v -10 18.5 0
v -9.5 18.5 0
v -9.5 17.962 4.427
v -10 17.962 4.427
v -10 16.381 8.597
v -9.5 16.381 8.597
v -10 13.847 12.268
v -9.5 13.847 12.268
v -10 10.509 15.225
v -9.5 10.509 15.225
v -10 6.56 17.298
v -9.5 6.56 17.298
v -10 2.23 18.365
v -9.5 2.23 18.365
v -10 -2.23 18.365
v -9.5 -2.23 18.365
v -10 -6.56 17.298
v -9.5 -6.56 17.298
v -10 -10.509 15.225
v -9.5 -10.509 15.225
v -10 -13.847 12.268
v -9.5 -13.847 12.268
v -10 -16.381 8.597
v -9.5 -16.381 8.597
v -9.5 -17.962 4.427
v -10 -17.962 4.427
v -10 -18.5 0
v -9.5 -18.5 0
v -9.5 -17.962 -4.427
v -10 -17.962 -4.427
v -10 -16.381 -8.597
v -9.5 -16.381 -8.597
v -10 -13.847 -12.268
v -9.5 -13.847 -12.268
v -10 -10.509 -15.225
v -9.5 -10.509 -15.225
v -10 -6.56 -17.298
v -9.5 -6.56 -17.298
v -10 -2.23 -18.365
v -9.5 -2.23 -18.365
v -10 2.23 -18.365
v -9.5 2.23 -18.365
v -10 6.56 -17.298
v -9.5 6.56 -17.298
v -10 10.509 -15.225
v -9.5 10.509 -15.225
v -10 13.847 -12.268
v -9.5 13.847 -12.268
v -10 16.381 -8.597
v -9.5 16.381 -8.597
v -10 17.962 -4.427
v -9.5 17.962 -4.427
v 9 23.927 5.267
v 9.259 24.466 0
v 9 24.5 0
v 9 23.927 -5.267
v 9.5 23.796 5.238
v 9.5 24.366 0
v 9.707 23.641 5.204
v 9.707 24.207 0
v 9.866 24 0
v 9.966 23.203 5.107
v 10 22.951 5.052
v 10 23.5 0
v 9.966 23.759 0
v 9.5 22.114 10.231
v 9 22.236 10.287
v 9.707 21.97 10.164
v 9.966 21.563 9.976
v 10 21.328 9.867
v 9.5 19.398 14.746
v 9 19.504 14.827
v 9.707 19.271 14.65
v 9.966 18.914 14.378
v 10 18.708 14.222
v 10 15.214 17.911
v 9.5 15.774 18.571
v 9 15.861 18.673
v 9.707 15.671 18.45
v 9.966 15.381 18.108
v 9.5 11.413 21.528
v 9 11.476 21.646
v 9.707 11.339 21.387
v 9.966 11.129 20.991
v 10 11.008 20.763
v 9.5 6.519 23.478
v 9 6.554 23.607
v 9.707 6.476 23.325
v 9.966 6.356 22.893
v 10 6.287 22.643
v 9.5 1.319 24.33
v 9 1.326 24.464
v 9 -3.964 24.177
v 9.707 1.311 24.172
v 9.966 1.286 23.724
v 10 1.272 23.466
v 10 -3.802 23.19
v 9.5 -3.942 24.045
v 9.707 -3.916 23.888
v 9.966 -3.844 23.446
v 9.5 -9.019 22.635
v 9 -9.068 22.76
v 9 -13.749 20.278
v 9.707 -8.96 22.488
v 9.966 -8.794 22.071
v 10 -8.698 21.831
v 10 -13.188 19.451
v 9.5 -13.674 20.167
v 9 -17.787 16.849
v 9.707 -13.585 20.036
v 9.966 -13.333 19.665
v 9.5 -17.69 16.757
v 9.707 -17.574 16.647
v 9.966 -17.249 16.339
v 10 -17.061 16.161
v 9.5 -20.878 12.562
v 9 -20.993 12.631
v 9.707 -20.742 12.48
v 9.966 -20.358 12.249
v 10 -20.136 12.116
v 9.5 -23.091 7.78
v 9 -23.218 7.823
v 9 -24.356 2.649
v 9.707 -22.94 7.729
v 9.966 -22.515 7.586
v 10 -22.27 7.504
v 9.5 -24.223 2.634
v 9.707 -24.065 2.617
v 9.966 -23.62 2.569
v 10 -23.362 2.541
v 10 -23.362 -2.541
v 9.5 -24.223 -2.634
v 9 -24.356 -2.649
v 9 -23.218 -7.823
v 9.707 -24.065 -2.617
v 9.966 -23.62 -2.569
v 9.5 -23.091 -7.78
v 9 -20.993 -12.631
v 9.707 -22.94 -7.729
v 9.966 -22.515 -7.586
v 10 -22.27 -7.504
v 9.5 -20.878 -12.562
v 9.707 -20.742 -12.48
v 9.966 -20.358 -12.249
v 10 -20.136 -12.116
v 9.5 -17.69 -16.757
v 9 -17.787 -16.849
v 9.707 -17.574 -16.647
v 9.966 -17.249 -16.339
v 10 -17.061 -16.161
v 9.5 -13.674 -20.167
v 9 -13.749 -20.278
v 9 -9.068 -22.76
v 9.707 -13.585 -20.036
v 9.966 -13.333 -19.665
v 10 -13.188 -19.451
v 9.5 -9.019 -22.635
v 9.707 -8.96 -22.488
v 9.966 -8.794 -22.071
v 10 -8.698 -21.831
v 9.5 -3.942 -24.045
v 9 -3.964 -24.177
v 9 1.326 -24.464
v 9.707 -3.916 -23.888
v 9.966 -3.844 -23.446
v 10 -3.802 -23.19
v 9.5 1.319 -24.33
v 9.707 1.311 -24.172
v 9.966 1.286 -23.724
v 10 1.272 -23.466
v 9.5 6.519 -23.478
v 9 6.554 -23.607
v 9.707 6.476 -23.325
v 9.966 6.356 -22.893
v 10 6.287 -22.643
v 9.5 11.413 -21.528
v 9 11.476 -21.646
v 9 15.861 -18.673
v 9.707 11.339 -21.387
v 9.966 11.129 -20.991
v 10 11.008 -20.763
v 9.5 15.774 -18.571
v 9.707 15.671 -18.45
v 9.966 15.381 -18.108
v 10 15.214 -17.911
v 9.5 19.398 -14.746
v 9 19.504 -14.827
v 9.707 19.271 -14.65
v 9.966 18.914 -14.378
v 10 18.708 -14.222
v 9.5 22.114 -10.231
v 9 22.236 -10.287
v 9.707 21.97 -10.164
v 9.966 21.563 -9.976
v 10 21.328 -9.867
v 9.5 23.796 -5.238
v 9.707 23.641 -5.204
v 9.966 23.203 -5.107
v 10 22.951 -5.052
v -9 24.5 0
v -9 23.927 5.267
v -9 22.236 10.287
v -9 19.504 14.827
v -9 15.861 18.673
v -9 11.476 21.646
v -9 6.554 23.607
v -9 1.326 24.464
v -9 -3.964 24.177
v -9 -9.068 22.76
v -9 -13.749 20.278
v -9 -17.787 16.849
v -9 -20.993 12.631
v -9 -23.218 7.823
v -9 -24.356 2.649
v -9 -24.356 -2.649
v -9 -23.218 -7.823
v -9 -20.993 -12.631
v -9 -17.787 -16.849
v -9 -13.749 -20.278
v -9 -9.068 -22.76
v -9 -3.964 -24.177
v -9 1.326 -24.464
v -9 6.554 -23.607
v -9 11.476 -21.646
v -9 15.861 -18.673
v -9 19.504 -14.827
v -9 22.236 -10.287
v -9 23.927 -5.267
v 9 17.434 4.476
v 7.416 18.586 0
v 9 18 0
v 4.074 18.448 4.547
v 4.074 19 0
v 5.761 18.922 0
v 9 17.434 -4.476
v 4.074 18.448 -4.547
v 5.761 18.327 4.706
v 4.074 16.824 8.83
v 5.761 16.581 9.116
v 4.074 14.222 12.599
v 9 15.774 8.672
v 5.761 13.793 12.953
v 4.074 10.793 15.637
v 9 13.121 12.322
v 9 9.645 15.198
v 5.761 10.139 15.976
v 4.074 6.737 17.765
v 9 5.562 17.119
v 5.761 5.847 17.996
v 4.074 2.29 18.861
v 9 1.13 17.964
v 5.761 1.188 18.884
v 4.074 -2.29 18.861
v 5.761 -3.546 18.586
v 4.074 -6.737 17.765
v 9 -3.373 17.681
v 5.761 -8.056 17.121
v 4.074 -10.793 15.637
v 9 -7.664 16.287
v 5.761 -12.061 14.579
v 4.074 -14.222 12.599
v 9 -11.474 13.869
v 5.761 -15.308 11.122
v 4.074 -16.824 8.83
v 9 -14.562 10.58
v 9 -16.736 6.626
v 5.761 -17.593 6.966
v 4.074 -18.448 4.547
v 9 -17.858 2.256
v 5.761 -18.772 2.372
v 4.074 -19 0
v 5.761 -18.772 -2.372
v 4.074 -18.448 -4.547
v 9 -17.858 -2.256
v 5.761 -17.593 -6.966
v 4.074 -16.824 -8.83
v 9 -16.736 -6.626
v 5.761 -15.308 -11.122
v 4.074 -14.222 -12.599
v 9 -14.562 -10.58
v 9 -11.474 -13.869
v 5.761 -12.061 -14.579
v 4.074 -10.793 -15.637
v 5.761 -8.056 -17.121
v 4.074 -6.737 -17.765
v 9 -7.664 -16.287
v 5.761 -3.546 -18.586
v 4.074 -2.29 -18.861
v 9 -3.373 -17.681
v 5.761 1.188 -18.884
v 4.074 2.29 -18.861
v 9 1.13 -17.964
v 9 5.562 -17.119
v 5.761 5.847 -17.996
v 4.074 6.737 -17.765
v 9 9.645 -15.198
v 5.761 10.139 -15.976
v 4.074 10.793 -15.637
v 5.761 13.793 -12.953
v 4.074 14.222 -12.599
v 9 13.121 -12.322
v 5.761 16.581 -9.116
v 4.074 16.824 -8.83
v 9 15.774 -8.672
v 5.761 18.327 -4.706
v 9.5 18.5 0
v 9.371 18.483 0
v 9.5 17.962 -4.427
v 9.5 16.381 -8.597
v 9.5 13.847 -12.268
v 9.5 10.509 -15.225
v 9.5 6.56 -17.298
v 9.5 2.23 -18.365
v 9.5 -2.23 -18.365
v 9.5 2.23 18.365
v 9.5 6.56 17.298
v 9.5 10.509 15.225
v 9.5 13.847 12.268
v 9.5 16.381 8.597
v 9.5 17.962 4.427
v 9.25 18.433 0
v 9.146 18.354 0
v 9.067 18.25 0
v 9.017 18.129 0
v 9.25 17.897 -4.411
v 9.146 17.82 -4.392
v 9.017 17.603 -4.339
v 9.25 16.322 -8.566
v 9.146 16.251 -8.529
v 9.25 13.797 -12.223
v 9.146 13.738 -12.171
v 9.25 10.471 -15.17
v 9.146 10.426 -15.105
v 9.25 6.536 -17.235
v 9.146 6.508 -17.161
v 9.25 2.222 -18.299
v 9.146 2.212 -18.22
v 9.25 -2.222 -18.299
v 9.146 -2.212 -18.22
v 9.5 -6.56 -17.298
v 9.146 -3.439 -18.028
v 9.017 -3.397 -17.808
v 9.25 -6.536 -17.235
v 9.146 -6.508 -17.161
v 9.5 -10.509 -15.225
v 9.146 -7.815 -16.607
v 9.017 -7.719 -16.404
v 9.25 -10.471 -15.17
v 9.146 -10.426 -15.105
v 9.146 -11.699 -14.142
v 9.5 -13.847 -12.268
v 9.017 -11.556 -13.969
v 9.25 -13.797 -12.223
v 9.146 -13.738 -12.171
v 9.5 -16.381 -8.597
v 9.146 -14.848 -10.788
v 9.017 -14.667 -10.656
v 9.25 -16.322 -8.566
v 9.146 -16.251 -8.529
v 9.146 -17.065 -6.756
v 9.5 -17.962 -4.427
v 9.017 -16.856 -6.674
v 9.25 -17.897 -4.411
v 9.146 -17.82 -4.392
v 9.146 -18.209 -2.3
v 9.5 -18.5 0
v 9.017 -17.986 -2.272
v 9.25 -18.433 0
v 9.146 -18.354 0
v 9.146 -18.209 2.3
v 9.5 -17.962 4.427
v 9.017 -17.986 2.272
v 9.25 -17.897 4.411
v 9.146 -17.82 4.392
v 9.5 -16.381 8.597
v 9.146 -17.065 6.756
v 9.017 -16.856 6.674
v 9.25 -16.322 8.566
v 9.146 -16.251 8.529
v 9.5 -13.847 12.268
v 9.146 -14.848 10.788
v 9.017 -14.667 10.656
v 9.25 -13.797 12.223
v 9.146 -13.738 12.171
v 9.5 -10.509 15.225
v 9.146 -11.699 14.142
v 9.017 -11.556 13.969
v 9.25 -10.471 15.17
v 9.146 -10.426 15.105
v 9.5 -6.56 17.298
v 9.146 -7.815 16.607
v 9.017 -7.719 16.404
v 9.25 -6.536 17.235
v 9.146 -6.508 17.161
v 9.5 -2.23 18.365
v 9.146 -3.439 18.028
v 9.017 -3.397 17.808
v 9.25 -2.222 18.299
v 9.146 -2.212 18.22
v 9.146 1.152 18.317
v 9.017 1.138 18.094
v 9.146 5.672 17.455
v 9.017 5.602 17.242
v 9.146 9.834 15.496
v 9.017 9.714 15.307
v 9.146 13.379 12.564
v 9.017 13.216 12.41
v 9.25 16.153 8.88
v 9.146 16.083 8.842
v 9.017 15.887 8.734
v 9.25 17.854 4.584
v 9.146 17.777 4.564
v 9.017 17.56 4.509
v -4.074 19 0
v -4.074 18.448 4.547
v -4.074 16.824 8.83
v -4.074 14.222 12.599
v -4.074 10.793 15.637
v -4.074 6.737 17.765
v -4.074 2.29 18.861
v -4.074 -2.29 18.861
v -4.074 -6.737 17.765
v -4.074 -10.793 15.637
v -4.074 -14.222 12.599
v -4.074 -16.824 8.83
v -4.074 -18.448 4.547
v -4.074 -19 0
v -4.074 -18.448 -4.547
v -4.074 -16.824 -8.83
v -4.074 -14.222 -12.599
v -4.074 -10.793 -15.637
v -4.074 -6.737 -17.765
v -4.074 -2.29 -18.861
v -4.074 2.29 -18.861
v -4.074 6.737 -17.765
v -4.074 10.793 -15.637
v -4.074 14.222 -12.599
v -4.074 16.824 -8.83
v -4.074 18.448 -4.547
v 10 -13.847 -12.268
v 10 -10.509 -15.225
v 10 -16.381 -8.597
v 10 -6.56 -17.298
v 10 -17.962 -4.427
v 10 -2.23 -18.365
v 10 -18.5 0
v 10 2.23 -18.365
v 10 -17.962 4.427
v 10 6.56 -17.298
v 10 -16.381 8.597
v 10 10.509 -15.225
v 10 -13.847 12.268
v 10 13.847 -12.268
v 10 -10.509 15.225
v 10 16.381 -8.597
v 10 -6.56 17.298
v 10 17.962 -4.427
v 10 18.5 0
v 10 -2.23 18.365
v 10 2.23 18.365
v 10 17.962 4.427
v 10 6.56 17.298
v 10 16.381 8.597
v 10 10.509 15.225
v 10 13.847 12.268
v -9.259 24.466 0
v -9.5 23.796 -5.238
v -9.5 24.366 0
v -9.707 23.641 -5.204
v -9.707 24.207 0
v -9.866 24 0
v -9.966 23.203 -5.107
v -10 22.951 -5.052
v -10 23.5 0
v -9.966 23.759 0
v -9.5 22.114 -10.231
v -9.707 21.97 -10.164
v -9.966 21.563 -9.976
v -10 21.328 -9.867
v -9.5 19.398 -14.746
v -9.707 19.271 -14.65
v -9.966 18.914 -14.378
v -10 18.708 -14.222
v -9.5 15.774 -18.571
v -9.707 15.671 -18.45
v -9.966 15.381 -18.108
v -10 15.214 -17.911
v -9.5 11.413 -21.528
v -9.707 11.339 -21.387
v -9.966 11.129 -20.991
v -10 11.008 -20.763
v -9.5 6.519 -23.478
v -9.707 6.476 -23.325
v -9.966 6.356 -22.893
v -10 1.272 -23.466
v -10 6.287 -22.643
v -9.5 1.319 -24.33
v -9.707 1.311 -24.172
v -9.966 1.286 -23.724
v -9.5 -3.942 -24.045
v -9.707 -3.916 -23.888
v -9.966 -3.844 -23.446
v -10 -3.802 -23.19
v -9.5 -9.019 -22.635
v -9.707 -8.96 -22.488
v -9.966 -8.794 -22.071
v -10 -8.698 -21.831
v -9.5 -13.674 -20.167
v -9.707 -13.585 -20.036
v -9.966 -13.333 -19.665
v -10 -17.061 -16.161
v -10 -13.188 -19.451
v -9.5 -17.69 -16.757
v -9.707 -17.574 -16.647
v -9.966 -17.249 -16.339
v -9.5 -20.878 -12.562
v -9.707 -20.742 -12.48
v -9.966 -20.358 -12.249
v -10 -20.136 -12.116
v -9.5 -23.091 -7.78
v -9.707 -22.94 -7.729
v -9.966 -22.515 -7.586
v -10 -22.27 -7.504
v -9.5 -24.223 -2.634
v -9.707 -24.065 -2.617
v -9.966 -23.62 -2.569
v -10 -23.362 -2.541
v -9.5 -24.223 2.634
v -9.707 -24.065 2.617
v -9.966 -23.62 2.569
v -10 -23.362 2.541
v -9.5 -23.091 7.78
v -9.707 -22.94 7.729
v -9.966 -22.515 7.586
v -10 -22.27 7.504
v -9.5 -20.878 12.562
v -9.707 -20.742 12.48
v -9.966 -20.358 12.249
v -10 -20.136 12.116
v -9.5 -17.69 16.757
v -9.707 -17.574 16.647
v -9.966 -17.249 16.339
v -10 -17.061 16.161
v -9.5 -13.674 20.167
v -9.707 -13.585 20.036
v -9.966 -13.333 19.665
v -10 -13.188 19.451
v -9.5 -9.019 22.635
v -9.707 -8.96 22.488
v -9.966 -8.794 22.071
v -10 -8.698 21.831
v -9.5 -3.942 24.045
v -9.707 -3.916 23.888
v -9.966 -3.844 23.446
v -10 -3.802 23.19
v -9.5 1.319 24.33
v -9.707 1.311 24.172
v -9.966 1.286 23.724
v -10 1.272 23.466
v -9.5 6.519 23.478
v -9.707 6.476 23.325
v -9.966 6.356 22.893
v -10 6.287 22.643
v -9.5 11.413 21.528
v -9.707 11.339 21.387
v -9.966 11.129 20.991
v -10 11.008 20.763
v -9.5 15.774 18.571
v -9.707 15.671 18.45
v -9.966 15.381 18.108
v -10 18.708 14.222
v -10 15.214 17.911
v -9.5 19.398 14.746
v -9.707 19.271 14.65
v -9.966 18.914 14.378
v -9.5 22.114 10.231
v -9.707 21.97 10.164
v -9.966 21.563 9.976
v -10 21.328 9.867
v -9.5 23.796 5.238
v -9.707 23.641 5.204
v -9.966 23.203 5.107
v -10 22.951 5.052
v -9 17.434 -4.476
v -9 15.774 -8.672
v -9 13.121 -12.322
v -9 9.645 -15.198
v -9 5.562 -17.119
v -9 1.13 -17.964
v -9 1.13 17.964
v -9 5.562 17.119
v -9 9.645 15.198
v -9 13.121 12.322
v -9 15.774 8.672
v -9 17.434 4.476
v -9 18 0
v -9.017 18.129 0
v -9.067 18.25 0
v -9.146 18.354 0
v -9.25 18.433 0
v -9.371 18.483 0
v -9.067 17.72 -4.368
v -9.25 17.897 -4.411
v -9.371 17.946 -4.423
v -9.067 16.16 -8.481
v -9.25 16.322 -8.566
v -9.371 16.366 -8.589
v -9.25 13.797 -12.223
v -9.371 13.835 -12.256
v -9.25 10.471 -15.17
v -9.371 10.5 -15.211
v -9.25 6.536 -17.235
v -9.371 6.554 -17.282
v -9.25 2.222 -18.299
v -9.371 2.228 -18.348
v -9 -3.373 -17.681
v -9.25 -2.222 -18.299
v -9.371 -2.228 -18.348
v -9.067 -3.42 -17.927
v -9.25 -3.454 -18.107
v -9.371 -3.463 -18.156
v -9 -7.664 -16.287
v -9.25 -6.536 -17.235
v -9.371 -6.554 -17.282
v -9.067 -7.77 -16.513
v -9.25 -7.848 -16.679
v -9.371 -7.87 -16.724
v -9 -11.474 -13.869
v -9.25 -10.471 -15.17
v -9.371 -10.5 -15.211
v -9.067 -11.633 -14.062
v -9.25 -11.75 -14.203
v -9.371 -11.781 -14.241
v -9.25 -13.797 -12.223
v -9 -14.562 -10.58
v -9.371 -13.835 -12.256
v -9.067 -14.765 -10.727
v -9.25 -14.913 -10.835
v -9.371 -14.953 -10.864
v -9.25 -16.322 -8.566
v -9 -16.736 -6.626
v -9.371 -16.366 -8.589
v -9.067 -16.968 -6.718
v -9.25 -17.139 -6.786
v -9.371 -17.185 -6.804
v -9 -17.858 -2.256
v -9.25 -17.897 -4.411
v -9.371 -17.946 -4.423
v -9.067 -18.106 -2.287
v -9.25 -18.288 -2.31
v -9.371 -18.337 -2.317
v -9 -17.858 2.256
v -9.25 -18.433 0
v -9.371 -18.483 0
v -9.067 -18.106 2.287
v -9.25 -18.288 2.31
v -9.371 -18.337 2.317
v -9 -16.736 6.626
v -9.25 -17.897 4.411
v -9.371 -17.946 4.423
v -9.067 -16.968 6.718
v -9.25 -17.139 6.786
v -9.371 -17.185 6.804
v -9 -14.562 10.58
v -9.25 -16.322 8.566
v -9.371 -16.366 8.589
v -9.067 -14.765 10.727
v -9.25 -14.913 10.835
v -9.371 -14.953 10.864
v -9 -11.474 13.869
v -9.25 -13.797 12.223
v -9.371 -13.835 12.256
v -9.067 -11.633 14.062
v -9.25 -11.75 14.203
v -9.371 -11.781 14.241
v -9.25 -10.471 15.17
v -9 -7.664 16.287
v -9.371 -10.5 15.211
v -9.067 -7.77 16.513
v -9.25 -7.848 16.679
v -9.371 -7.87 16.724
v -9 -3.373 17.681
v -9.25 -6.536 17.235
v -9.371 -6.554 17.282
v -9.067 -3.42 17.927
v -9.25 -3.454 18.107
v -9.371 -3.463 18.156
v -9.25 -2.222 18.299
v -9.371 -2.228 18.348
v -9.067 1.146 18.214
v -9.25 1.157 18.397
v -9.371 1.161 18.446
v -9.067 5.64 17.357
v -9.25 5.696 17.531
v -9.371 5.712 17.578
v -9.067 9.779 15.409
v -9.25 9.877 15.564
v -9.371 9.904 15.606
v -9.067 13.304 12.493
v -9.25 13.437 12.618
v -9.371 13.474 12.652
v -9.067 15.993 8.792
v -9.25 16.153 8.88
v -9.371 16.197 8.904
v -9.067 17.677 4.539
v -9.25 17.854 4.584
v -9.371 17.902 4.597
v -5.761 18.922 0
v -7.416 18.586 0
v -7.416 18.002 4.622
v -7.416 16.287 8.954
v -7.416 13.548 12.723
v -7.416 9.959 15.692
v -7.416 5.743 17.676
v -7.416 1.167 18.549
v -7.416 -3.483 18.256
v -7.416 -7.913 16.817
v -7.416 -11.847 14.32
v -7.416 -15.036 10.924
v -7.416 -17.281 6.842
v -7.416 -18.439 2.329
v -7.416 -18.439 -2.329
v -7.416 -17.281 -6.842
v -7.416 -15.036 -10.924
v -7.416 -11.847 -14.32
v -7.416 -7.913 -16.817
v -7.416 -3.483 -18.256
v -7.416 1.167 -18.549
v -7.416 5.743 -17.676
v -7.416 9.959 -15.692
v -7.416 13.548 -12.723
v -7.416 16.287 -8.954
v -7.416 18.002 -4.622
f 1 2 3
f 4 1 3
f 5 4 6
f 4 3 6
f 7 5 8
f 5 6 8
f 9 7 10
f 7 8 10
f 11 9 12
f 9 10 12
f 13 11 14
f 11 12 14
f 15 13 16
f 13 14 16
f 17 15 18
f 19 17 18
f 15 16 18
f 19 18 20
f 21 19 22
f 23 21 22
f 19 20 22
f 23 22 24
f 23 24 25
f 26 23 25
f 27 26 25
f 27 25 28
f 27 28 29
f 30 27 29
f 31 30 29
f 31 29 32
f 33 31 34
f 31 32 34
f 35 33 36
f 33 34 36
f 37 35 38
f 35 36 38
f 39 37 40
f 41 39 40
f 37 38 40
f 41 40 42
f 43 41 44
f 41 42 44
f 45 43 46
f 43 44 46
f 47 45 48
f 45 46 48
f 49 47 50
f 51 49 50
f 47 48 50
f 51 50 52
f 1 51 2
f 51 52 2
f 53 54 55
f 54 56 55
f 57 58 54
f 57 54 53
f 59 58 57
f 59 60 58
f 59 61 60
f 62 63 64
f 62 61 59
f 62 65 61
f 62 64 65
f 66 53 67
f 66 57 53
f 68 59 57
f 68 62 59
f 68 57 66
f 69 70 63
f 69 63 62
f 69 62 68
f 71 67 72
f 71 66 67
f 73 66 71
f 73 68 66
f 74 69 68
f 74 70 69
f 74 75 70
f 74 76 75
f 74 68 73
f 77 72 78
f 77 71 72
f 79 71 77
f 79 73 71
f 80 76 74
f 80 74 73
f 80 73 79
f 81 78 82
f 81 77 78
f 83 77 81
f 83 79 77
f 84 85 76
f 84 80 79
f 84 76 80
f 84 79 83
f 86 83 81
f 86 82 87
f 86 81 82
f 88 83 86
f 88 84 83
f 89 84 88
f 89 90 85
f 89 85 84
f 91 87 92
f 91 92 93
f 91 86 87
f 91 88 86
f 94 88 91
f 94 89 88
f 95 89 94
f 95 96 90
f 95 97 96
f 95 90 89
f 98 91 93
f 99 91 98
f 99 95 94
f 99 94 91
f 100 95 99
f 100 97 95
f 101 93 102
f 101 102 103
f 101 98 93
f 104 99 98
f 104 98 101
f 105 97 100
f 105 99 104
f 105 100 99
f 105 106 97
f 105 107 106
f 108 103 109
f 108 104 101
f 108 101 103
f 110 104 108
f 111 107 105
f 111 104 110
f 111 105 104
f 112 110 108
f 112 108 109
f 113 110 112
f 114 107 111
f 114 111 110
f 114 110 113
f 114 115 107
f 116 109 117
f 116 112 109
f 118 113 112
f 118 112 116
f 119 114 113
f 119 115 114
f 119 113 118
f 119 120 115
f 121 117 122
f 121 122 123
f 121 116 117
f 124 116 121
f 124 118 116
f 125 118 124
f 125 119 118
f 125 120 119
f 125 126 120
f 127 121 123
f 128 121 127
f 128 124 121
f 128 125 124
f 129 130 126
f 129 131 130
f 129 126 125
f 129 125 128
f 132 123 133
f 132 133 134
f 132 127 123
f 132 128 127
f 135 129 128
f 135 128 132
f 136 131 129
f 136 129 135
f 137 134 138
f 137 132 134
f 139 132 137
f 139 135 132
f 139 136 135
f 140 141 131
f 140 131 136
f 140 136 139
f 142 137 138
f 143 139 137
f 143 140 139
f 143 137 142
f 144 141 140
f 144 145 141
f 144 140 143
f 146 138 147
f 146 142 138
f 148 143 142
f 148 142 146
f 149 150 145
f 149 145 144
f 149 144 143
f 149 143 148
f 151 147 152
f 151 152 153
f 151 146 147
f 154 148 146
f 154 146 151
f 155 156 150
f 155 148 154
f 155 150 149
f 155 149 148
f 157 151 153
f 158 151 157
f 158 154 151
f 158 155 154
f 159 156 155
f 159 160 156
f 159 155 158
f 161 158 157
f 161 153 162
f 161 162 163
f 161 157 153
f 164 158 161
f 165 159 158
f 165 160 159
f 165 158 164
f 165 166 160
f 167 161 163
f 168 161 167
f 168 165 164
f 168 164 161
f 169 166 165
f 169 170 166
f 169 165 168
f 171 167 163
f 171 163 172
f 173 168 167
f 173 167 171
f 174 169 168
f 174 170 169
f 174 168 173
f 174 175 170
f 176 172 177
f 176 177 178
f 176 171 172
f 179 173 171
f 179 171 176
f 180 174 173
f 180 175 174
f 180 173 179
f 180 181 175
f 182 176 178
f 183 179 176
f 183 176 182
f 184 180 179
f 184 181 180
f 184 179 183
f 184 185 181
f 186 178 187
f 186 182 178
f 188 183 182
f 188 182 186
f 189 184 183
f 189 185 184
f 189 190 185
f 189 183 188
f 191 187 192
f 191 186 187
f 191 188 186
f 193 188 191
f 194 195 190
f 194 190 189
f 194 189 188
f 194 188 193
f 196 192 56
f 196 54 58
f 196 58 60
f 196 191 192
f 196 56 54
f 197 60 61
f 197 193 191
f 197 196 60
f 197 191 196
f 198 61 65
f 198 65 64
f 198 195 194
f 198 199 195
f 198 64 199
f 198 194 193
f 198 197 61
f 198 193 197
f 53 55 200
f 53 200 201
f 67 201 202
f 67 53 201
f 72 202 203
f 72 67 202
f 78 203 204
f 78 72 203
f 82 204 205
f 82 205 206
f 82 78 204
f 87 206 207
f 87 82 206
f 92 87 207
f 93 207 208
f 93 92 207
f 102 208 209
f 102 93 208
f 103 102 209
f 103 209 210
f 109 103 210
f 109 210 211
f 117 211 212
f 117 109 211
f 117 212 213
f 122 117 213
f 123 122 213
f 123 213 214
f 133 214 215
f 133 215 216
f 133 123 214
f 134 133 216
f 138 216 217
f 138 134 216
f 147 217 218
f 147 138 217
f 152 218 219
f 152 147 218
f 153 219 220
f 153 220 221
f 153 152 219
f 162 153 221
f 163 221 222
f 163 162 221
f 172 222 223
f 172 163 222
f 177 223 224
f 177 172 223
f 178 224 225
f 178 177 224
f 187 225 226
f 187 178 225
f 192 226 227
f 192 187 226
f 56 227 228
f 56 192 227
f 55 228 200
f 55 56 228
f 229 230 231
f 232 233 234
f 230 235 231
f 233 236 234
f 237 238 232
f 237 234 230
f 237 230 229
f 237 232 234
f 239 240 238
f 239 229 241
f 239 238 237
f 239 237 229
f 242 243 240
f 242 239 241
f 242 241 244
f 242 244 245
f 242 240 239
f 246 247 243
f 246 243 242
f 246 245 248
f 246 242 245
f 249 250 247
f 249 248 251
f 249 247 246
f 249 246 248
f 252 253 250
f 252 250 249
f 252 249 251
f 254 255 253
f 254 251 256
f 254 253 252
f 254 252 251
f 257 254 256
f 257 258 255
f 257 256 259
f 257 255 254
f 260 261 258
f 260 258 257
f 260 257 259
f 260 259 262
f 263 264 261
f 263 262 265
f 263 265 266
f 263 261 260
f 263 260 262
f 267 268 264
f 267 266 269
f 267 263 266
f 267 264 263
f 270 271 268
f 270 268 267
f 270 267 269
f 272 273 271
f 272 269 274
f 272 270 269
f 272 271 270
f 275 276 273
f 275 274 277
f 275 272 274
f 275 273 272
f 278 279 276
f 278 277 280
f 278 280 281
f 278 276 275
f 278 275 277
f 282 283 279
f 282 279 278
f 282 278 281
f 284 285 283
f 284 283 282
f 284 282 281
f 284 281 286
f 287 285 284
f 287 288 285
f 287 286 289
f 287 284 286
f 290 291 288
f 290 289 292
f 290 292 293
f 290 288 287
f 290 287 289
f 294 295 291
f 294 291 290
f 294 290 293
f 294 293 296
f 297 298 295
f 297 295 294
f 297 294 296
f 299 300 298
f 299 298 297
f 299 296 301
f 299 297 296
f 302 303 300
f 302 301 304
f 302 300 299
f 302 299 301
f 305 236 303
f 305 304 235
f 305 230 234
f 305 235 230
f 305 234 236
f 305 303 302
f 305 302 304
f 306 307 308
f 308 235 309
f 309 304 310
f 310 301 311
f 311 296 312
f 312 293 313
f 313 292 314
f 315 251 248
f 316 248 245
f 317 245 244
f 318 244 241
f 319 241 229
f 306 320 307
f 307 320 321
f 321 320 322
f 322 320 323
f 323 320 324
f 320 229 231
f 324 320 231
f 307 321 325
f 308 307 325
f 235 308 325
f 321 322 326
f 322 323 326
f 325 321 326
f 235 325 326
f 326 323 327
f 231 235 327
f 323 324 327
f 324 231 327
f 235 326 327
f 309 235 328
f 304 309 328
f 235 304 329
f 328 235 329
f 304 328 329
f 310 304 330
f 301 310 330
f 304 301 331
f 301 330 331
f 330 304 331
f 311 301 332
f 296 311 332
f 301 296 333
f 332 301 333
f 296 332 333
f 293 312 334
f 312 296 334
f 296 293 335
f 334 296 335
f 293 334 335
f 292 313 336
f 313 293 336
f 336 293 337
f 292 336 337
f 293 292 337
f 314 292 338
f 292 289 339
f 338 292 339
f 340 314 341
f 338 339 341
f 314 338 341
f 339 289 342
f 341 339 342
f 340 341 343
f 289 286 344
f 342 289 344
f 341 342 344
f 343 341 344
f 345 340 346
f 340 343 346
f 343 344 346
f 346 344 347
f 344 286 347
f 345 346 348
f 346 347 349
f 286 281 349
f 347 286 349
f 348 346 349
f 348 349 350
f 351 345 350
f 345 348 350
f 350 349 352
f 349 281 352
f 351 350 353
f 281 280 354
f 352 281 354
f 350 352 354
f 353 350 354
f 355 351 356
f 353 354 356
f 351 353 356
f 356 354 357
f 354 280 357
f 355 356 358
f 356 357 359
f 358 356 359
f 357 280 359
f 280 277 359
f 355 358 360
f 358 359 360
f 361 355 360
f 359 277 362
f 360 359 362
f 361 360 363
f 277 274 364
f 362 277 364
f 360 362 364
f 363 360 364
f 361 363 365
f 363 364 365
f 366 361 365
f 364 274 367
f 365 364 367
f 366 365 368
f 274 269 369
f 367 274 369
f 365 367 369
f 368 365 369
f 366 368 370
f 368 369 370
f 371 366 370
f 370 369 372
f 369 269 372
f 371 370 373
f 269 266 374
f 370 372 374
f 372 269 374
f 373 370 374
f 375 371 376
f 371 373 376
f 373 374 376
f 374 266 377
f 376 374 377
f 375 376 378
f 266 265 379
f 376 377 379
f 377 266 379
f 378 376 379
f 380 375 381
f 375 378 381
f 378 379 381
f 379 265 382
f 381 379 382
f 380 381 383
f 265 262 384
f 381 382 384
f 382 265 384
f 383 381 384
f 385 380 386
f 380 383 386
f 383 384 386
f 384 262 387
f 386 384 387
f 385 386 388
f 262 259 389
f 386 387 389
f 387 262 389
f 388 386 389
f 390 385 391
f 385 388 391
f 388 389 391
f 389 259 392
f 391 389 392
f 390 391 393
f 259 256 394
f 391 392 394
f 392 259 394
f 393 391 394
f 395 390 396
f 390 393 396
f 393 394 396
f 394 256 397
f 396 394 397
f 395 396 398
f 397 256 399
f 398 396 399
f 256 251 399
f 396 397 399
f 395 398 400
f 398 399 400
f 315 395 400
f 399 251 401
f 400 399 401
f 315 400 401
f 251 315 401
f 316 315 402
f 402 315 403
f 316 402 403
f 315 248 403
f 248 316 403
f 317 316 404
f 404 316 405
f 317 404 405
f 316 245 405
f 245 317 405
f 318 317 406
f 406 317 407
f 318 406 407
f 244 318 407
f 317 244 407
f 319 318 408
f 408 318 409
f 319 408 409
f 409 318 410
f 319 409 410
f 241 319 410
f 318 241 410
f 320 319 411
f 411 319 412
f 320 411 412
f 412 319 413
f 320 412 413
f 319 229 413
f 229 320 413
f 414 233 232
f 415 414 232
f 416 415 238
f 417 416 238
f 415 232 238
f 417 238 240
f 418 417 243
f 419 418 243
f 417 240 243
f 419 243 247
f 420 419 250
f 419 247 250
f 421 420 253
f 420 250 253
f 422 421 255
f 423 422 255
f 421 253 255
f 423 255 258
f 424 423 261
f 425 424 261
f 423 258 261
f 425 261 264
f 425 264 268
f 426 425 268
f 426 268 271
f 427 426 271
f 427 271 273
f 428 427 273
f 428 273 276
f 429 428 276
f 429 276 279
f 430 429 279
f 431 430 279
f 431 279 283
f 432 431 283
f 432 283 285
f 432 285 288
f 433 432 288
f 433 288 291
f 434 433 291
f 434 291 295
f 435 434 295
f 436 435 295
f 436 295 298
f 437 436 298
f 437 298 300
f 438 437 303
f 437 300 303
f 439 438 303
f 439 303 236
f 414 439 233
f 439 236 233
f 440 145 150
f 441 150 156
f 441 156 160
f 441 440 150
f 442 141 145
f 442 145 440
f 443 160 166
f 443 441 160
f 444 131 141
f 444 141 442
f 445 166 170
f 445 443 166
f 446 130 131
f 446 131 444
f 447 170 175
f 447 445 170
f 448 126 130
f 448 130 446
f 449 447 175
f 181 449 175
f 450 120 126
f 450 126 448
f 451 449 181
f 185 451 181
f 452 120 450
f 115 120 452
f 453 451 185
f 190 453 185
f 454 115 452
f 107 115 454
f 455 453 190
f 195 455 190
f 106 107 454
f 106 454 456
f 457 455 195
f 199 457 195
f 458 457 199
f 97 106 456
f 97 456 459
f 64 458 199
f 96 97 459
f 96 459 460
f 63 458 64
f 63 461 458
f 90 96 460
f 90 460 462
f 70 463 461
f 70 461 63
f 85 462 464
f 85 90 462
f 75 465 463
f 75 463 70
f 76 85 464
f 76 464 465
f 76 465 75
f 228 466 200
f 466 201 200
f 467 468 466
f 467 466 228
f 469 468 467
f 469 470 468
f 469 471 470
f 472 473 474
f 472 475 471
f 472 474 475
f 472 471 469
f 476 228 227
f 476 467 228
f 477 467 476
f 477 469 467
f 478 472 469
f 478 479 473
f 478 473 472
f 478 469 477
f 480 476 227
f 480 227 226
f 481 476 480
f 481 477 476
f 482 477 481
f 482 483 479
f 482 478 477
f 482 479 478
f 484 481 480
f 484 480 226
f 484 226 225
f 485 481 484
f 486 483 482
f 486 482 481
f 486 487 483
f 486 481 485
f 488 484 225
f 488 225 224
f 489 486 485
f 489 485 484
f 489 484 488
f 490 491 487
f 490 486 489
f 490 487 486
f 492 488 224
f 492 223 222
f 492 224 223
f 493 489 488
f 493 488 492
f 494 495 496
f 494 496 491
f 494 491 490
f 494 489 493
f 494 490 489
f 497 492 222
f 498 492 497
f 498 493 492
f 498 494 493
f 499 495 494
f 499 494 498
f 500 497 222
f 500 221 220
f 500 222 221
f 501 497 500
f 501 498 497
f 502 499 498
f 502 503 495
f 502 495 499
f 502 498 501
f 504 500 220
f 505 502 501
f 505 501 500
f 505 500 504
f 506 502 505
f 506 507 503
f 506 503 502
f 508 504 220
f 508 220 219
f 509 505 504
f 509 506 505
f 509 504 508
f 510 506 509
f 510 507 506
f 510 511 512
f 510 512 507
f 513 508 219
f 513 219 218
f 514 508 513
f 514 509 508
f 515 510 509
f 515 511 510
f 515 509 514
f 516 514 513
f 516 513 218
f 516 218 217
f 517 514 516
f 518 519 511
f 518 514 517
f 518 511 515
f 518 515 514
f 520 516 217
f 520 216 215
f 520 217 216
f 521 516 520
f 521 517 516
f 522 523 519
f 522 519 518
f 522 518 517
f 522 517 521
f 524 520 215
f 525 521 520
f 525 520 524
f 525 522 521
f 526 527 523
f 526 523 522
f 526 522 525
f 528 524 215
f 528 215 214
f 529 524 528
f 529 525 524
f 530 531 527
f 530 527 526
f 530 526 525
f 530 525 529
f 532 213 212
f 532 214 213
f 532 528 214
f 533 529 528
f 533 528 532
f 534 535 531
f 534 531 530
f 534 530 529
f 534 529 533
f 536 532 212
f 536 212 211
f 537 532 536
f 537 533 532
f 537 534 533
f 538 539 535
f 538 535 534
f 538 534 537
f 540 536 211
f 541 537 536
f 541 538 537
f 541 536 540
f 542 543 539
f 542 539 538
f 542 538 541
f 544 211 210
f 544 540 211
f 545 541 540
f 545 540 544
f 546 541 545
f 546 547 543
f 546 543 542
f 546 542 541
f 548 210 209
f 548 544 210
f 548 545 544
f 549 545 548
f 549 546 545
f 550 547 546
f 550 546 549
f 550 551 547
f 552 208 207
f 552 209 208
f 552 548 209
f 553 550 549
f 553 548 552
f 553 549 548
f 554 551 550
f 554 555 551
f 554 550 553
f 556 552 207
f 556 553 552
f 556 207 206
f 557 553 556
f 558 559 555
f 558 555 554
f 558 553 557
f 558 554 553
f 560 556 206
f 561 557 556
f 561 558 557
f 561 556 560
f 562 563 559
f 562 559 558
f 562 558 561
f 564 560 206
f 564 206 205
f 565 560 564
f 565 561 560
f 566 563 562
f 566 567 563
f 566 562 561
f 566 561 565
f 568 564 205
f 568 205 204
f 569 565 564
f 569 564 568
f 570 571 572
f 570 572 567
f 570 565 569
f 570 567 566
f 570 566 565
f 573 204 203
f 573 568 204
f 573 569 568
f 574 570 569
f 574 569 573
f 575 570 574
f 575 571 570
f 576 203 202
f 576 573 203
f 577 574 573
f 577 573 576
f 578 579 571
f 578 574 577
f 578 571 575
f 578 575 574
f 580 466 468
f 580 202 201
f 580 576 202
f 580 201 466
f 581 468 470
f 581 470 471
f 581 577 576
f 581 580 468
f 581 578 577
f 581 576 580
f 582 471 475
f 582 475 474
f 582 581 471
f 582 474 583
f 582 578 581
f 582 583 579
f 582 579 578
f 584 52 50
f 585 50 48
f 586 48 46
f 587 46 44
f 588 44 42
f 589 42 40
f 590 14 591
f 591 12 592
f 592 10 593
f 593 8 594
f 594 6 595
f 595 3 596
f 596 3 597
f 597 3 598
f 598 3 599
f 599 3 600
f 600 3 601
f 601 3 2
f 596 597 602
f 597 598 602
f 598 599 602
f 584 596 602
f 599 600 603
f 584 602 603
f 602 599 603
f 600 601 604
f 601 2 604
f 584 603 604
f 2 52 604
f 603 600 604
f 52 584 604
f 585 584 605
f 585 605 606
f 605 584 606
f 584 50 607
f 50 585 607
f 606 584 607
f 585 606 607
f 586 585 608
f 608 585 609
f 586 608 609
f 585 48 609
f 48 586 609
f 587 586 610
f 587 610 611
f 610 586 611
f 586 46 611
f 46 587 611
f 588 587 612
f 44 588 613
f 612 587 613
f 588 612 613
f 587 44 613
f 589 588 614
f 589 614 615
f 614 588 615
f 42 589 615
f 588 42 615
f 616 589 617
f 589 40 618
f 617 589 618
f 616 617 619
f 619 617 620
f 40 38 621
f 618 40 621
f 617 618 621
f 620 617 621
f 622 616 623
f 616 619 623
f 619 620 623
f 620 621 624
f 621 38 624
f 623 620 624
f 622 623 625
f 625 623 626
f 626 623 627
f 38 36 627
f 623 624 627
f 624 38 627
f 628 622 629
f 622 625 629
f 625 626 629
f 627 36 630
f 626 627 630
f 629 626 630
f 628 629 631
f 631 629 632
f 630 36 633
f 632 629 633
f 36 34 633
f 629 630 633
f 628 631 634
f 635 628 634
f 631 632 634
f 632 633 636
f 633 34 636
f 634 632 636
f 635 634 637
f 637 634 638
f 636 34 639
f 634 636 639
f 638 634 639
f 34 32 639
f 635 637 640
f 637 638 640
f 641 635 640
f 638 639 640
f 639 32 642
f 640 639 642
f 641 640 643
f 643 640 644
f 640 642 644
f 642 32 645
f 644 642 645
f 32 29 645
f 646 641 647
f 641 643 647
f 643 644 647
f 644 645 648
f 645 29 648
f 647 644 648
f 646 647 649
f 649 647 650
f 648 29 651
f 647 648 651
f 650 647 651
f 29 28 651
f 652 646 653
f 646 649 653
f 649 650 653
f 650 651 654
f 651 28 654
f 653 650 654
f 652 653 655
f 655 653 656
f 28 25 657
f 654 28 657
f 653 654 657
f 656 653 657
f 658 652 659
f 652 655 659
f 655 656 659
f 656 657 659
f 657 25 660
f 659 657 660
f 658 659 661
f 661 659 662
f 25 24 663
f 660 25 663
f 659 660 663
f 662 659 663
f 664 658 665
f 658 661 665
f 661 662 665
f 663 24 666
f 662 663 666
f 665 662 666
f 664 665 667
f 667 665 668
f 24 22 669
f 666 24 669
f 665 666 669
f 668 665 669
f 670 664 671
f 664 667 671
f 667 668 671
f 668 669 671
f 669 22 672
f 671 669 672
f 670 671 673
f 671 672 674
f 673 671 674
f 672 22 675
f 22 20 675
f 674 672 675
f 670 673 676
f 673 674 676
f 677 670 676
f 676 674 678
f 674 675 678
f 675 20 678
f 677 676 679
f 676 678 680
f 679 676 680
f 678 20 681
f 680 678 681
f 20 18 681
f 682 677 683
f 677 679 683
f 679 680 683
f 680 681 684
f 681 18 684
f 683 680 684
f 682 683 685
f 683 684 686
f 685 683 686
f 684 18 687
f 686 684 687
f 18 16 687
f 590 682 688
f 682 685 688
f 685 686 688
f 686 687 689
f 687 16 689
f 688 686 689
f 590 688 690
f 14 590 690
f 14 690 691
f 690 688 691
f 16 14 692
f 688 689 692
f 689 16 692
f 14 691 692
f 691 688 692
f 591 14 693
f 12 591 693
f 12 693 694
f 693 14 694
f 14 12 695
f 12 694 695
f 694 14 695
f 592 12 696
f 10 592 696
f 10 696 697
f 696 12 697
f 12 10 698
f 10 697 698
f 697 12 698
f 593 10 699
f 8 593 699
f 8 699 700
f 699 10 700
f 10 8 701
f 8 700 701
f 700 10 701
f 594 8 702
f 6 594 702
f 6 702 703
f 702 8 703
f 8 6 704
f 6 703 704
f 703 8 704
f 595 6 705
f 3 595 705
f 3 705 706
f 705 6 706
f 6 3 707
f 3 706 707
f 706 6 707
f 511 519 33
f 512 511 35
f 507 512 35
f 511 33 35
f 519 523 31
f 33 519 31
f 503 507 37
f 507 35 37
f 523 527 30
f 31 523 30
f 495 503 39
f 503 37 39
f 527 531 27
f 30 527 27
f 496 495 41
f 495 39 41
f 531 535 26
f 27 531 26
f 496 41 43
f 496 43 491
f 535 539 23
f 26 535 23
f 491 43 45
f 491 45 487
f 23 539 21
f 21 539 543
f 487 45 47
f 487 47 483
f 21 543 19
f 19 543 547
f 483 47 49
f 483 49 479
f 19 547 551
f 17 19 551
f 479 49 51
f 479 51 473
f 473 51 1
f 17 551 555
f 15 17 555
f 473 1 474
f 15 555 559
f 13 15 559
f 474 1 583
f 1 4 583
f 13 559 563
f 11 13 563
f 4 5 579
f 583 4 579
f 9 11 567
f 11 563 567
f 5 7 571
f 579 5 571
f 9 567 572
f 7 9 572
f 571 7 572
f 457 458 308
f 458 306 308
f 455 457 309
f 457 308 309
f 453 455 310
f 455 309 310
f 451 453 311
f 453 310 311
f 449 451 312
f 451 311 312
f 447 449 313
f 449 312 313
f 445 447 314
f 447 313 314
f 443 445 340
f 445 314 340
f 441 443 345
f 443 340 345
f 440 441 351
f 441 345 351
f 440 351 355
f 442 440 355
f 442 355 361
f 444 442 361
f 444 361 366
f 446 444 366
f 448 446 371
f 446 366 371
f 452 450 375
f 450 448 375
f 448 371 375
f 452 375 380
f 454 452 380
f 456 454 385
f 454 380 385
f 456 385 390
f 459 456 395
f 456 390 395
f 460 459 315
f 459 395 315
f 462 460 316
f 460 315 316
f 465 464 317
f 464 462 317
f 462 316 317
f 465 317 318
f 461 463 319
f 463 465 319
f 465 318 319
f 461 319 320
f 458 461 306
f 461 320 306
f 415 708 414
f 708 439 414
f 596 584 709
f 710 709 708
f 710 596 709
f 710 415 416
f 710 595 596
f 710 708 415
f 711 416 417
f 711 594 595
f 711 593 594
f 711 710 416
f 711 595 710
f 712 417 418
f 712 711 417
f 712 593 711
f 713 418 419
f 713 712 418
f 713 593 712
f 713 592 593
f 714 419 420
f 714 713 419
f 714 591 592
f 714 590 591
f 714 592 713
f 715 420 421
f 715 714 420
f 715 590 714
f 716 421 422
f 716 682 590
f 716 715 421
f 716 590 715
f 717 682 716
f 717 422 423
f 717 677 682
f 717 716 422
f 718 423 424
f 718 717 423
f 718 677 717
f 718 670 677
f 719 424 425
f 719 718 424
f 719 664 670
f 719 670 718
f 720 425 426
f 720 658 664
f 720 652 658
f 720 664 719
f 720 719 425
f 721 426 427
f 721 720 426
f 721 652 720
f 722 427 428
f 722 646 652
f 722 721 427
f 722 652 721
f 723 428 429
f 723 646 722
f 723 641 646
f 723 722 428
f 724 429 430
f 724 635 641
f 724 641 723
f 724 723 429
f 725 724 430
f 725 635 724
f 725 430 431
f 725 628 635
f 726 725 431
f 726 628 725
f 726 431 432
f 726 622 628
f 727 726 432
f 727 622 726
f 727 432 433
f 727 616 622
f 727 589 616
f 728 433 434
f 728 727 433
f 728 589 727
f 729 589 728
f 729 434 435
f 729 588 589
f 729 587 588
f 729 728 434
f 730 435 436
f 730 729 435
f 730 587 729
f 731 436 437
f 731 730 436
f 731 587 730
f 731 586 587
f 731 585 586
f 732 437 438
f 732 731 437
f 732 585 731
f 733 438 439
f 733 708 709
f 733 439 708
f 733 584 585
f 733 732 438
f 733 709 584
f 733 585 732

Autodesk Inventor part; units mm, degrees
ref_plane "YZ Plane" through (0, 0, 0) normal (1, 0, 0) x (0, 1, 0)
ref_plane "XZ Plane" through (0, 0, 0) normal (0, 1, 0) x (-1, 0, 0)
ref_plane "XY Plane" through (0, 0, 0) normal (0, 0, 1) x (1, 0, 0)
sketch "草图1" plane through (0, 0, 0) normal (0, 0, 1) x (1, 0, 0)
  line L0 (-10, 24.5) -> (10, 24.5)
  line L1 (-14, 0) -> (14, 0) projected
  line L2 (0, -4.9) -> (0, 29.4) projected
  line L3 (-10, 24.5) -> (-10, 18.5)
  line L4 (-10, 18.5) -> (-9.5, 18.5)
  arc A0 (-9, 18) -> (-9.5, 18.5) centre (-9.5, 18) ccw
  line L5 (-9.5, 18) -> (-7.8897, 18) construction
  arc A1 (-4.0742, 19) -> (-9, 18) centre (-4.4094, 8.0196) ccw
  line L6 (10, 24.5) -> (10, 18.5)
  line L7 (10, 18.5) -> (9.5, 18.5)
  arc A2 (9.5, 18.5) -> (9, 18) centre (9.5, 18) ccw
  arc A3 (9, 18) -> (4.0742, 19) centre (4.4094, 8.0196) ccw
  line L8 (-4.0742, 19) -> (4.0742, 19)
  point P0 (0, 0)
  dimension "d0" = 20
  dimension "d1" = 0.5
  dimension "d2" = 6
  dimension "d3" = 1
  dimension "d4" = 24.5
  dimension "d7" = 10.9856
  dimension "d8" = 8.1484
  dimension "d11" = 19
  dimension "d12" = 18
revolve "旋转1" add sketch "草图1" angle 360 about axis through (-10, 0, 0) along (1, 0, 0)
fillet "圆角1" radius 1 2 edges at (-10, -24.5, 0) (10, -24.5, 0)
properties part number "橡胶外轮设计" material "橡胶"
